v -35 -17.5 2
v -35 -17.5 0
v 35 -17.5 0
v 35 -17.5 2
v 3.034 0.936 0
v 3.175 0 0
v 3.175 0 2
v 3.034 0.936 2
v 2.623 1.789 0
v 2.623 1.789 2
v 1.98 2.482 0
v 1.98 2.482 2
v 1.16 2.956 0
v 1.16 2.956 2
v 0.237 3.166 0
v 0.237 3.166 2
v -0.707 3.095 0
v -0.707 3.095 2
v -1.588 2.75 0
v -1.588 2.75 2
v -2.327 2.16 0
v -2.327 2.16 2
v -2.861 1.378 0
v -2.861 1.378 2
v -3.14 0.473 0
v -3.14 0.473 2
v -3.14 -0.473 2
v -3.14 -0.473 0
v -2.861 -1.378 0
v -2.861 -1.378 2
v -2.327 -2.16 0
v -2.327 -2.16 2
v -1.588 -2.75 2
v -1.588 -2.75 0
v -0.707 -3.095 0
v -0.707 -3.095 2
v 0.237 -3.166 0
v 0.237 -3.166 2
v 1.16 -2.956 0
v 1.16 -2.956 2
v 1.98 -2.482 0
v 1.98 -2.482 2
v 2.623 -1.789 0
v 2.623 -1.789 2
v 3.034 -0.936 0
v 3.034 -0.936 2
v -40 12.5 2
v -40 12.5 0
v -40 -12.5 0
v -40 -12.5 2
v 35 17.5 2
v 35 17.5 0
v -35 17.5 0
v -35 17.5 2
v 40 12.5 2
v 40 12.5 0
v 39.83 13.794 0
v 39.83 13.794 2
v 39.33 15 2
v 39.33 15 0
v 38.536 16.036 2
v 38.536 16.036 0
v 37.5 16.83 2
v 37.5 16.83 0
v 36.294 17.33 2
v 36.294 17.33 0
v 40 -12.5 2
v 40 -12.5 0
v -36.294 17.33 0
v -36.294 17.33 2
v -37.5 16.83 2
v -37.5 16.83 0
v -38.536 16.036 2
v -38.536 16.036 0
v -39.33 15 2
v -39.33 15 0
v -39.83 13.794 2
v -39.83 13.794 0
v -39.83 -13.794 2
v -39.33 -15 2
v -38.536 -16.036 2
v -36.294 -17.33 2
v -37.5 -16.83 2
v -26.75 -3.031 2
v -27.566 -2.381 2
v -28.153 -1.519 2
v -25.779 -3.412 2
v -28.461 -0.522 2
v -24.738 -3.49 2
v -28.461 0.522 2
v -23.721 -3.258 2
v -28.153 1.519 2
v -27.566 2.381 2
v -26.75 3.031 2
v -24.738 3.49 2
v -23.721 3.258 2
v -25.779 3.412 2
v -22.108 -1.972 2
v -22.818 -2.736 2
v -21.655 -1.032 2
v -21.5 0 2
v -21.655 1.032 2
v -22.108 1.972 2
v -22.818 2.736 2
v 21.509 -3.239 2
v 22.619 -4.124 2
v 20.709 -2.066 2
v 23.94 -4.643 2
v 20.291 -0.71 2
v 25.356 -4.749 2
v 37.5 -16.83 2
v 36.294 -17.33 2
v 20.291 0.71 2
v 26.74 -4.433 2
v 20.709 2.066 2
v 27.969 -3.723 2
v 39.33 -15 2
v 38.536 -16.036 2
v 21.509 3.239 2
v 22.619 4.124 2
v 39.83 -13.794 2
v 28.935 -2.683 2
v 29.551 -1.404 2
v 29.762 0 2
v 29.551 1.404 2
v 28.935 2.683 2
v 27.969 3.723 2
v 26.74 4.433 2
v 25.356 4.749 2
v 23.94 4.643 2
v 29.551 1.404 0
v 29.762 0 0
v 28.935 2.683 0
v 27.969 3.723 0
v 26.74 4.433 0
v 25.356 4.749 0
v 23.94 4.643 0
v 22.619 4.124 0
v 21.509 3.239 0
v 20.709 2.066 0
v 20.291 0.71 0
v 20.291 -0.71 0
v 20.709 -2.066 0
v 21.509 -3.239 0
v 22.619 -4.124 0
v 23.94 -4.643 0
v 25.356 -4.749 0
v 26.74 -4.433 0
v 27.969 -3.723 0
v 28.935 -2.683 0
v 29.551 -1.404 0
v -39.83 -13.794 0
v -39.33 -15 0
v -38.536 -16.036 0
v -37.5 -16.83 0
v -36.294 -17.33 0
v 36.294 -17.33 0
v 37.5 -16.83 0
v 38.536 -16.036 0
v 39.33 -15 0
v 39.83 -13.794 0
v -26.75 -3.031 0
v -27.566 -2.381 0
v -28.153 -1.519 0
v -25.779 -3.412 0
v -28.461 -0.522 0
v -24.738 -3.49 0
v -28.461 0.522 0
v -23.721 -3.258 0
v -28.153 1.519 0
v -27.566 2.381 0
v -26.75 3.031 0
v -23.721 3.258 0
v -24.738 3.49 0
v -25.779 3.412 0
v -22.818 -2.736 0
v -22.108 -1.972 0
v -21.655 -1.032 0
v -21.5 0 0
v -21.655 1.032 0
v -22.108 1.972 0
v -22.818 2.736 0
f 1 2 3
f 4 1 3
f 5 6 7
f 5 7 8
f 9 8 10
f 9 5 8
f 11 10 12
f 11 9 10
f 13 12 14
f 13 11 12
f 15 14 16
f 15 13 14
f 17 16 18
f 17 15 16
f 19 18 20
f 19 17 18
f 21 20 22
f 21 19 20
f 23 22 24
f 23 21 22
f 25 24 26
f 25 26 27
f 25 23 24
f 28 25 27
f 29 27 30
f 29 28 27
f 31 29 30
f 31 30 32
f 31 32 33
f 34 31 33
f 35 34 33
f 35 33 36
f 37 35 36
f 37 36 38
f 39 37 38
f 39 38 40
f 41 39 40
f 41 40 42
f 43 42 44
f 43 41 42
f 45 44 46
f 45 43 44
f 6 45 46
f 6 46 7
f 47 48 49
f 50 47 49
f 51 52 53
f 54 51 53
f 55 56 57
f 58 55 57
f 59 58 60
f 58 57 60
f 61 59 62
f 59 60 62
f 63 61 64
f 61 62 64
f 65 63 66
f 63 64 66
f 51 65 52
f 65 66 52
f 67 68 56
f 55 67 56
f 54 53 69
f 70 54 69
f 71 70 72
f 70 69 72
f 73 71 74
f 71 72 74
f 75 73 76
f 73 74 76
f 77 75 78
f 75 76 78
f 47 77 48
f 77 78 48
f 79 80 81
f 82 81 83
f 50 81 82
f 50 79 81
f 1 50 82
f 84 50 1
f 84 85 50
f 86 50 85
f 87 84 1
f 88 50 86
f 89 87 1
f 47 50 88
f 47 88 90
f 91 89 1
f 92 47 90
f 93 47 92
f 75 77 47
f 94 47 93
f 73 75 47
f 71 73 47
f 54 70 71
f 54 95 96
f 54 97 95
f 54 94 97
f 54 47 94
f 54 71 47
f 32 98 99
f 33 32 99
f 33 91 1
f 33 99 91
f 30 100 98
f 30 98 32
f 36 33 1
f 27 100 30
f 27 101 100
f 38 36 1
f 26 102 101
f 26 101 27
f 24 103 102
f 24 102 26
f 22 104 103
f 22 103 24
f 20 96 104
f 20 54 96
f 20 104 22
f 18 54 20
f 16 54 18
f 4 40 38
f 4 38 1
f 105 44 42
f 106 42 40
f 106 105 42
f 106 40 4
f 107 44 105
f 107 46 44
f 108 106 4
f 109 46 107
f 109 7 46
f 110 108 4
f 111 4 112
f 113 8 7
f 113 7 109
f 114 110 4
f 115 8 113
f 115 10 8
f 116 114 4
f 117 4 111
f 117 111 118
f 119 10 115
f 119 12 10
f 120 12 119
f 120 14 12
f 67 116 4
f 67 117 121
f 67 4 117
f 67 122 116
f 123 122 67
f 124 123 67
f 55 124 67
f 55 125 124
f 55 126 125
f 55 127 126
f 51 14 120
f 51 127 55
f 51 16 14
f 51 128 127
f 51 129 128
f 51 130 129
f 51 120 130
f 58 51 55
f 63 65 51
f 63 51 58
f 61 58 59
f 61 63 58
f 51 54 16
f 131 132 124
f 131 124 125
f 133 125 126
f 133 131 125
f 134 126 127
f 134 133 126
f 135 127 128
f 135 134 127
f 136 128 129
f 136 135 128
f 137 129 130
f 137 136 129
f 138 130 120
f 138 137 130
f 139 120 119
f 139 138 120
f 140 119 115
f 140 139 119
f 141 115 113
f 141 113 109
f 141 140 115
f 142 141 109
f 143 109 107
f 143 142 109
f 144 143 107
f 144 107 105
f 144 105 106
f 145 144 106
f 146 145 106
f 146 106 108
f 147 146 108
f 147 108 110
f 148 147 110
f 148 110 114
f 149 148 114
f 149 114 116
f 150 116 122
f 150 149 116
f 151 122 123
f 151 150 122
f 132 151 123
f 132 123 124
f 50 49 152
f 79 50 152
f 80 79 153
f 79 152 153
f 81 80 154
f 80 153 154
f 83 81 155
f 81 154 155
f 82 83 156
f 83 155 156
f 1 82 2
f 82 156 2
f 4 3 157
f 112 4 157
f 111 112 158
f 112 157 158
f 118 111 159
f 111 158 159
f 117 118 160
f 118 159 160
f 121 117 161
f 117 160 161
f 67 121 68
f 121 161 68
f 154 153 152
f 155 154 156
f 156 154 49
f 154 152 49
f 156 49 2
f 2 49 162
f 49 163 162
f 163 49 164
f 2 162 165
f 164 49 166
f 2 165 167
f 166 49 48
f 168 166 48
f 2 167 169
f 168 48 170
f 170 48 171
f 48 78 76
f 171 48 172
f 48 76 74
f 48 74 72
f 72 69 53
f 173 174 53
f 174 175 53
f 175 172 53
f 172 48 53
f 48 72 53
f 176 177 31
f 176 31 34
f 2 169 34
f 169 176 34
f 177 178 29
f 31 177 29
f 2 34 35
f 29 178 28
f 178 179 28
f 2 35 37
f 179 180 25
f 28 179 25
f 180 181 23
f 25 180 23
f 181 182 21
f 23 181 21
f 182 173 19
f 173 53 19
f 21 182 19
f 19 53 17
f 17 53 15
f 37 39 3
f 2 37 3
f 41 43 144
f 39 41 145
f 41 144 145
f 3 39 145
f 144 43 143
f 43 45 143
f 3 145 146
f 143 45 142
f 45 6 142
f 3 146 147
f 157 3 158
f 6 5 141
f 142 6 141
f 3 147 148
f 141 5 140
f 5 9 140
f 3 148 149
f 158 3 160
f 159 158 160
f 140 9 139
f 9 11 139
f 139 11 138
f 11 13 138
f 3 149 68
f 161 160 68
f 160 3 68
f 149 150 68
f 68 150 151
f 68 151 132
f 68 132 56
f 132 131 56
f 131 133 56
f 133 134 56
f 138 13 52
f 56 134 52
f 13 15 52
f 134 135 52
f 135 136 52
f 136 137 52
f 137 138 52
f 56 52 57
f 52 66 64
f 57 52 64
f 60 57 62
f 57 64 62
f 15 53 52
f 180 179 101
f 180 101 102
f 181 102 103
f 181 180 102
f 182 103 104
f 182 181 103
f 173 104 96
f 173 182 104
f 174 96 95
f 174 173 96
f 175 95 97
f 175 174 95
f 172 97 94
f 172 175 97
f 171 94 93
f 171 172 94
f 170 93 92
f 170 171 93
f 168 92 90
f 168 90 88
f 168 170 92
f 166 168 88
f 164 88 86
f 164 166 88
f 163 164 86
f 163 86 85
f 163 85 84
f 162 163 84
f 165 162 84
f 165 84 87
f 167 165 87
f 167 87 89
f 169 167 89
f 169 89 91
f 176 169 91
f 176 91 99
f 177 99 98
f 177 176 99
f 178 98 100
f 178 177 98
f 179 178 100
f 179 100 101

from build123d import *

# Parameters (mm, degrees)
F0_R     = 3.5
F0_R_2   = 3.175
F0_R_3   = 4.7625
F1_DEPTH = 2


with BuildPart() as f1:
    # F0 (on Top) → F1 (new body)
    with BuildSketch(Plane.XY):
        with BuildLine():
            ThreePointArc((40, 12.5), (38.535534, 16.035534), (35, 17.5))
            Line((35, 17.5), (-35, 17.5))
            ThreePointArc((-35, 17.5), (-38.535534, 16.035534), (-40, 12.5))
            Line((-40, 12.5), (-40, -12.5))
            ThreePointArc((-40, -12.5), (-38.535534, -16.035534), (-35, -17.5))
            Line((-35, -17.5), (35, -17.5))
            ThreePointArc((35, -17.5), (38.535534, -16.035534), (40, -12.5))
            Line((40, -12.5), (40, 12.5))
        make_face()
        with Locations((-25, 0)):
            Circle(F0_R, mode=Mode.SUBTRACT)
        Circle(F0_R_2, mode=Mode.SUBTRACT)
        with Locations((25, 0)):
            Circle(F0_R_3, mode=Mode.SUBTRACT)
    extrude(amount=F1_DEPTH)


solid = f1.part
